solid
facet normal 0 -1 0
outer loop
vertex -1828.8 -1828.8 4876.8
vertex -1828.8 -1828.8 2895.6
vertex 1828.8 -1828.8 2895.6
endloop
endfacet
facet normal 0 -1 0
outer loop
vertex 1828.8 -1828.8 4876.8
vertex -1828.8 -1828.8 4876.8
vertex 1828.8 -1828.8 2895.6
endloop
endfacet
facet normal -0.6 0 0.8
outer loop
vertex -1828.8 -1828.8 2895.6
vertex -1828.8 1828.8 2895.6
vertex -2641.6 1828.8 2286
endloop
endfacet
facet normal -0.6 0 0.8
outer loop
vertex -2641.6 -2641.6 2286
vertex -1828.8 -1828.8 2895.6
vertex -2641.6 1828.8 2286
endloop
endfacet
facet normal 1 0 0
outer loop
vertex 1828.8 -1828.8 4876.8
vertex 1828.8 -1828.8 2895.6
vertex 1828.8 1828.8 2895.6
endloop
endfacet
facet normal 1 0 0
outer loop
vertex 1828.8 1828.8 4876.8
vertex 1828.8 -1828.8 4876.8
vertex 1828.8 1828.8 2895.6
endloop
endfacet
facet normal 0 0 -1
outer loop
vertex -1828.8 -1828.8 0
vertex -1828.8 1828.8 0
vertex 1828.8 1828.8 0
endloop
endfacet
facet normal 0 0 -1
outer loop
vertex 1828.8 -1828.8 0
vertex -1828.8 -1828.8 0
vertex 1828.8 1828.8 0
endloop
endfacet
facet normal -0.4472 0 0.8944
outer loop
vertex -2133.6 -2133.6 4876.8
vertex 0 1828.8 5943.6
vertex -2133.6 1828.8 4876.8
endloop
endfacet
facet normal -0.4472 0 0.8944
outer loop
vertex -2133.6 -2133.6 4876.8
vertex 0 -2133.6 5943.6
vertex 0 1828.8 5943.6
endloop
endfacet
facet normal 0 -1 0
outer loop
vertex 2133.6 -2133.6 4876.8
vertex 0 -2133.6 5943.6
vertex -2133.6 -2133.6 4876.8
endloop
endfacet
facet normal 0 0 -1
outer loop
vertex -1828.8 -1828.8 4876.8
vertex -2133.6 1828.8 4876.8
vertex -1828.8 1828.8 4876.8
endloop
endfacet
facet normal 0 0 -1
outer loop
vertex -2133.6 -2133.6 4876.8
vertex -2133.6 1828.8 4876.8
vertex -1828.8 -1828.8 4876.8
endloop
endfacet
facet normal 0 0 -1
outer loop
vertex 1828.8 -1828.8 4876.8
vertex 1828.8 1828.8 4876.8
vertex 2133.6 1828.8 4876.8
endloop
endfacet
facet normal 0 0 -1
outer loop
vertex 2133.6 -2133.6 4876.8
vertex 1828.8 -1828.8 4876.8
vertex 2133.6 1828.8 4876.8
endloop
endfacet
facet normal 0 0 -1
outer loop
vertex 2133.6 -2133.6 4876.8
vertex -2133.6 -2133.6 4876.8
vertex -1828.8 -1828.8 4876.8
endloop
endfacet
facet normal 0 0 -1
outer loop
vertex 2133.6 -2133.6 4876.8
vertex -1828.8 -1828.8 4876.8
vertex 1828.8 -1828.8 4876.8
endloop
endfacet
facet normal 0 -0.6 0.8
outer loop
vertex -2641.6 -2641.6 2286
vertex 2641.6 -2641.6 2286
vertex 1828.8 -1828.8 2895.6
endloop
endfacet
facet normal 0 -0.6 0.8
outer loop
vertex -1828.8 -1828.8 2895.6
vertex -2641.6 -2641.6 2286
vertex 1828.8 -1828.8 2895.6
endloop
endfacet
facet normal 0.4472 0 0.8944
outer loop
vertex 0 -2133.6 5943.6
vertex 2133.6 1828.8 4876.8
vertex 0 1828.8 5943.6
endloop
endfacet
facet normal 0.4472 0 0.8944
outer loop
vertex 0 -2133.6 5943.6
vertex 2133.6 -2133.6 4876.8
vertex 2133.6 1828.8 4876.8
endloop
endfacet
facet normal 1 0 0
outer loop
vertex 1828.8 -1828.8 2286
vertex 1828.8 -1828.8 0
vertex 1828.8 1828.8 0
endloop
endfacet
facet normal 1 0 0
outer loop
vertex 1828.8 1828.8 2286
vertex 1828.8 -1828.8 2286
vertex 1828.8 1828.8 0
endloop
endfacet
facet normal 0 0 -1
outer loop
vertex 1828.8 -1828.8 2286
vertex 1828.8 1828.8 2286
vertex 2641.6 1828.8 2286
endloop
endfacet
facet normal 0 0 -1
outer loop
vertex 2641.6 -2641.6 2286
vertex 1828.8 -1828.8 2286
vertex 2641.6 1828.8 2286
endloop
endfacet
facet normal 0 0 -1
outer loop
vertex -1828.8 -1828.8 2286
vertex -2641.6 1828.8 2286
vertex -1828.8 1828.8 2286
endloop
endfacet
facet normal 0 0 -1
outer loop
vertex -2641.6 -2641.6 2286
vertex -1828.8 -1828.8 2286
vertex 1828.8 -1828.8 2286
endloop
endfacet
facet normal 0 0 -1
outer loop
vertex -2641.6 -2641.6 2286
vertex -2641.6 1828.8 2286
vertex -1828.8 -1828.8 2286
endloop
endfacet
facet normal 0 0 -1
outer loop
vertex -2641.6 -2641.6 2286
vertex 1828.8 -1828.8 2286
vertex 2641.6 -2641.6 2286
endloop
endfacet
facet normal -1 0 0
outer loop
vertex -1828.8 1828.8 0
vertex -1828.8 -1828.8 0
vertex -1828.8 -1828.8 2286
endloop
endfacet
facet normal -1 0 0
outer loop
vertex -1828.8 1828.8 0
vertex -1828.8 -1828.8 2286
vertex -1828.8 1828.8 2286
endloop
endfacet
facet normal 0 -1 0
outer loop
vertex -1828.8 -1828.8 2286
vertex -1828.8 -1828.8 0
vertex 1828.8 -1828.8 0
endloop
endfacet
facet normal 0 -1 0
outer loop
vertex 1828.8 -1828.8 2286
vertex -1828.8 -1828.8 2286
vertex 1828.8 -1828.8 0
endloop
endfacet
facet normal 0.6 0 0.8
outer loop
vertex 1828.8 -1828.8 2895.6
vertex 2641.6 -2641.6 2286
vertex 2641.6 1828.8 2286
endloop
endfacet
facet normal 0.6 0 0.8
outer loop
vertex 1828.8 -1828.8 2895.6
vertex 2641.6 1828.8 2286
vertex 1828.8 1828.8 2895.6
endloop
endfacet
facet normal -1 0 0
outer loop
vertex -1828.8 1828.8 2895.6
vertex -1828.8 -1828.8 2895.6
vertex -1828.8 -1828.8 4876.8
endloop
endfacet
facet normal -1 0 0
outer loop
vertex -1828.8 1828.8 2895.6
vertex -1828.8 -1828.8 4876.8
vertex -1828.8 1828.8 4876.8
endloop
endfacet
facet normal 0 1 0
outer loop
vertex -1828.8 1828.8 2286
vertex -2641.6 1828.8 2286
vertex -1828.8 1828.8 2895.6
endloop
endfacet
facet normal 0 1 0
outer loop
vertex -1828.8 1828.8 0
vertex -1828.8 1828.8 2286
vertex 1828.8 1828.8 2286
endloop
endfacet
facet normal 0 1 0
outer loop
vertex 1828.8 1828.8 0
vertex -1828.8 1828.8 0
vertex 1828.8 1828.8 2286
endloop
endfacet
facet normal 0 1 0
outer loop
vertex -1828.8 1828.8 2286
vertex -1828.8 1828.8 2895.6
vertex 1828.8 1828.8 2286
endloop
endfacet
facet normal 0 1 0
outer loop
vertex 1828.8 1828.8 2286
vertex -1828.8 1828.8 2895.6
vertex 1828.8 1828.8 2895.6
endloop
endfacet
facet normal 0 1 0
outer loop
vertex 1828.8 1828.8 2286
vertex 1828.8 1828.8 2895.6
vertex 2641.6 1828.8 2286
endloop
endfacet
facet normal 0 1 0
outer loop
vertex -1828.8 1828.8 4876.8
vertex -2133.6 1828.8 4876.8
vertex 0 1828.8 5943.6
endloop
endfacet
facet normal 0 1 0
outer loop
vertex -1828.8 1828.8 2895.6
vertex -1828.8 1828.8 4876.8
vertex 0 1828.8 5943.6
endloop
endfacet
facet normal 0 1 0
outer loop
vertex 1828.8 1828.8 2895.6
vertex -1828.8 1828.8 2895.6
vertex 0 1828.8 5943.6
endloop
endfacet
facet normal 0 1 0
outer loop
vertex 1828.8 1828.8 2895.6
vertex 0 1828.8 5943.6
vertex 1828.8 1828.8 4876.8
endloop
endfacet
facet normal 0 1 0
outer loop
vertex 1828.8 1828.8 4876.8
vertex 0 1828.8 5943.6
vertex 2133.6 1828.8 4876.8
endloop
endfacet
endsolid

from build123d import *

# Parameters (mm, degrees)
F0_W          = 3657.6
F0_H          = 3657.6
F1_DEPTH      = 4876.8
F3_DEPTH      = 304.8
F3_DEPTH_BACK = 3657.6
F5_DEPTH      = 3657.6
F5_DEPTH_BACK = 1092.2
F7_DEPTH      = 871.22
F7_DEPTH_BACK = 4513.58
F9_DEPTH      = 5384.801
F11_DEPTH     = 4470.401


with BuildPart() as f1:
    # F0 (on Top) → F1 (new body)
    with BuildSketch(Plane.XY):
        Rectangle(F0_W, F0_H)
    extrude(amount=F1_DEPTH)

    # F2 (on face) → F3 (join, two sides)
    with BuildSketch(Plane.XZ.offset(1828.8)) as f3_sk:
        Polygon((0, 5943.6), (-2133.6, 4876.8), (2133.6, 4876.8), align=None)
    extrude(amount=F3_DEPTH)
    extrude(f3_sk.sketch, amount=-F3_DEPTH_BACK)

    # F4 (on face) → F5 (join, two sides)
    with BuildSketch(Plane.XZ.offset(1828.8)) as f5_sk:
        Polygon((-1828.8, 2286), (-1828.8, 2895.6), (-2641.6, 2286), align=None)
        Polygon((2641.6, 2286), (1828.8, 2895.6), (1828.8, 2286), align=None)
    extrude(amount=-F5_DEPTH)
    extrude(f5_sk.sketch, amount=-F5_DEPTH_BACK)

    # F6 (on face) → F7 (join, two sides)
    with BuildSketch(Plane(origin=(-1828.8, 0, 0), x_dir=(0, -1, 0), z_dir=(-1, 0, 0))) as f7_sk:
        Polygon((1828.8, 2895.6), (1828.8, 2286), (2641.6, 2286), align=None)
    extrude(amount=F7_DEPTH)
    extrude(f7_sk.sketch, amount=-F7_DEPTH_BACK)

    # F8 (on face) → F9 (cut, through all)
    with BuildSketch(Plane(origin=(-2700.02, 0, 0), x_dir=(0, -1, 0), z_dir=(-1, 0, 0))):
        Polygon((3195.674896, 2895.6), (1828.8, 2895.6), (2641.6, 2286), (3195.674896, 2286), align=None)
    extrude(amount=-F9_DEPTH, mode=Mode.SUBTRACT)

    # F10 (on face) → F11 (cut, through all)
    with BuildSketch(Plane(origin=(0, 1828.8, 0), x_dir=(-1, 0, 0), z_dir=(0, 1, 0))):
        Polygon((-2641.6, 2286), (-1828.8, 2895.6), (-2902.575731, 2895.6), (-2902.575731, 2286), align=None)
        Polygon((2902.575731, 2286), (2902.575731, 2895.6), (1828.8, 2895.6), (2641.6, 2286), align=None)
    extrude(amount=-F11_DEPTH, mode=Mode.SUBTRACT)


solid = f1.part
